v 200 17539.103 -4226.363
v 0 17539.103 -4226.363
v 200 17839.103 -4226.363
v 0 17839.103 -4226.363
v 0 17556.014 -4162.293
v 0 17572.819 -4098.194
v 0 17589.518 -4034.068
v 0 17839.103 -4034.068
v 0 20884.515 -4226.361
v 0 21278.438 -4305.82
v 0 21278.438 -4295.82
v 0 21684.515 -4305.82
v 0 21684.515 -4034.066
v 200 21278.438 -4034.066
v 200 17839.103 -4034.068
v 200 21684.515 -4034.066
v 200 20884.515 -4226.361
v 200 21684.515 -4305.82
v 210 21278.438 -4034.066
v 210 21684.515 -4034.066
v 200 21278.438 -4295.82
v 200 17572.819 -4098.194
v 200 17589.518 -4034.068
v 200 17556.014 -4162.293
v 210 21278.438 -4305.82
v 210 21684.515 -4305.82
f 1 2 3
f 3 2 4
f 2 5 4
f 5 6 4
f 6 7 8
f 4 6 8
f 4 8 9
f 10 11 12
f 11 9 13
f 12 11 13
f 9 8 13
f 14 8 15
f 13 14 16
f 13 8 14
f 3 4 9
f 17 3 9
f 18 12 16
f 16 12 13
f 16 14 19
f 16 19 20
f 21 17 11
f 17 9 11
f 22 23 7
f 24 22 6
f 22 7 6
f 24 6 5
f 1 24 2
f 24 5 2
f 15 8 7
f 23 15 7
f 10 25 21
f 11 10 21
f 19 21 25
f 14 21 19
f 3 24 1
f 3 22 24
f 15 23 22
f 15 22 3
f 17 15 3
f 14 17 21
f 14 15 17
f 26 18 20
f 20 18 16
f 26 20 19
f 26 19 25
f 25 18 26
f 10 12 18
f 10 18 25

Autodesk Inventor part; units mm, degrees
ref_plane "YZ Plane" through (0, 0, 0) normal (1, 0, 0) x (0, 1, 0)
ref_plane "XZ Plane" through (0, 0, 0) normal (0, 1, 0) x (-1, 0, 0)
ref_plane "XY Plane" through (0, 0, 0) normal (0, 0, 1) x (1, 0, 0)
sketch "Sketch2" plane through (0, 0, 0) normal (1, 0, 0) x (0, 1, 0)
  line L0 (17266.7168, -4180.2603) -> (17266.7177, -4180.2555)
  line L1 (21684.5168, -7422.7726) -> (21684.5142, -2804.0577)
  arc A0 (17539.1028, -4226.3631) -> (17589.5175, -4034.0683) centre (-21127.9015, 6013.8899) ccw
  line L2 (17539.1028, -4226.3631) -> (17839.1028, -4226.363)
  line L3 (17839.1028, -4226.363) -> (17839.1027, -4034.0682)
  line L4 (17839.1027, -4034.0682) -> (17589.5175, -4034.0683)
  line L5 (17839.1027, -4034.0682) -> (21684.5149, -4034.0659)
  line L6 (17839.1028, -4226.363) -> (21684.515, -4226.3608)
  line L7 (20884.515, -4226.3612) -> (21278.4381, -4295.8205)
  line L8 (20884.515, -4226.3612) -> (21284.515, -4226.3612) construction
  line L9 (21278.4381, -4295.8205) -> (21278.4381, -3784.3997)
  line L10 (20884.515, -4034.0664) -> (21278.4381, -3964.6071)
  line L11 (20884.515, -4034.0664) -> (21284.515, -4034.0664) construction
  line L12 (21278.4381, -3964.6071) -> (21278.4381, -3954.6071)
  line L13 (21278.4381, -3954.6071) -> (21684.5148, -3954.6069)
  line L14 (21278.4381, -4295.8205) -> (21278.4381, -4305.8205)
  line L15 (21278.4381, -4305.8205) -> (21684.515, -4305.8203)
  point P0 (0, 0)
  dimension "d0" = 40000
  dimension "d1" = 300
  dimension "d5" = 400
  dimension "d6" = 10
  dimension "d7" = 10
  dimension "d8" = 10
  dimension "d9" = 10
extrude "Extrusion1" add sketch "Sketch2" along normal blind 200 contours L15 L14 L9 L6 L1 | L6 L9 L5 L1 | L9 L7 L6 | L6 L3 L5 L9 | L2 A0 L4 L3
sketch "Sketch3" plane through (200, 0, 0) normal (1, 0, 0) x (0, 0, -1)
  line L0 (4305.8203, 21684.515) -> (4034.0659, 21684.5149) projected
  line L1 (4305.8205, 21278.4381) -> (4034.0659, 21278.4381)
  line L2 (4034.0659, 21278.4381) -> (4034.0659, 21684.5149)
  line L3 (4034.0659, 21684.5149) -> (4305.8205, 21684.5149)
  line L4 (4305.8205, 21684.5149) -> (4305.8205, 21278.4381)
  point P0 (0, 0)
extrude "Extrusion2" add sketch "Sketch3" along normal blind 10
properties part number "side_pillar_02" material "Wood (Maple)"
